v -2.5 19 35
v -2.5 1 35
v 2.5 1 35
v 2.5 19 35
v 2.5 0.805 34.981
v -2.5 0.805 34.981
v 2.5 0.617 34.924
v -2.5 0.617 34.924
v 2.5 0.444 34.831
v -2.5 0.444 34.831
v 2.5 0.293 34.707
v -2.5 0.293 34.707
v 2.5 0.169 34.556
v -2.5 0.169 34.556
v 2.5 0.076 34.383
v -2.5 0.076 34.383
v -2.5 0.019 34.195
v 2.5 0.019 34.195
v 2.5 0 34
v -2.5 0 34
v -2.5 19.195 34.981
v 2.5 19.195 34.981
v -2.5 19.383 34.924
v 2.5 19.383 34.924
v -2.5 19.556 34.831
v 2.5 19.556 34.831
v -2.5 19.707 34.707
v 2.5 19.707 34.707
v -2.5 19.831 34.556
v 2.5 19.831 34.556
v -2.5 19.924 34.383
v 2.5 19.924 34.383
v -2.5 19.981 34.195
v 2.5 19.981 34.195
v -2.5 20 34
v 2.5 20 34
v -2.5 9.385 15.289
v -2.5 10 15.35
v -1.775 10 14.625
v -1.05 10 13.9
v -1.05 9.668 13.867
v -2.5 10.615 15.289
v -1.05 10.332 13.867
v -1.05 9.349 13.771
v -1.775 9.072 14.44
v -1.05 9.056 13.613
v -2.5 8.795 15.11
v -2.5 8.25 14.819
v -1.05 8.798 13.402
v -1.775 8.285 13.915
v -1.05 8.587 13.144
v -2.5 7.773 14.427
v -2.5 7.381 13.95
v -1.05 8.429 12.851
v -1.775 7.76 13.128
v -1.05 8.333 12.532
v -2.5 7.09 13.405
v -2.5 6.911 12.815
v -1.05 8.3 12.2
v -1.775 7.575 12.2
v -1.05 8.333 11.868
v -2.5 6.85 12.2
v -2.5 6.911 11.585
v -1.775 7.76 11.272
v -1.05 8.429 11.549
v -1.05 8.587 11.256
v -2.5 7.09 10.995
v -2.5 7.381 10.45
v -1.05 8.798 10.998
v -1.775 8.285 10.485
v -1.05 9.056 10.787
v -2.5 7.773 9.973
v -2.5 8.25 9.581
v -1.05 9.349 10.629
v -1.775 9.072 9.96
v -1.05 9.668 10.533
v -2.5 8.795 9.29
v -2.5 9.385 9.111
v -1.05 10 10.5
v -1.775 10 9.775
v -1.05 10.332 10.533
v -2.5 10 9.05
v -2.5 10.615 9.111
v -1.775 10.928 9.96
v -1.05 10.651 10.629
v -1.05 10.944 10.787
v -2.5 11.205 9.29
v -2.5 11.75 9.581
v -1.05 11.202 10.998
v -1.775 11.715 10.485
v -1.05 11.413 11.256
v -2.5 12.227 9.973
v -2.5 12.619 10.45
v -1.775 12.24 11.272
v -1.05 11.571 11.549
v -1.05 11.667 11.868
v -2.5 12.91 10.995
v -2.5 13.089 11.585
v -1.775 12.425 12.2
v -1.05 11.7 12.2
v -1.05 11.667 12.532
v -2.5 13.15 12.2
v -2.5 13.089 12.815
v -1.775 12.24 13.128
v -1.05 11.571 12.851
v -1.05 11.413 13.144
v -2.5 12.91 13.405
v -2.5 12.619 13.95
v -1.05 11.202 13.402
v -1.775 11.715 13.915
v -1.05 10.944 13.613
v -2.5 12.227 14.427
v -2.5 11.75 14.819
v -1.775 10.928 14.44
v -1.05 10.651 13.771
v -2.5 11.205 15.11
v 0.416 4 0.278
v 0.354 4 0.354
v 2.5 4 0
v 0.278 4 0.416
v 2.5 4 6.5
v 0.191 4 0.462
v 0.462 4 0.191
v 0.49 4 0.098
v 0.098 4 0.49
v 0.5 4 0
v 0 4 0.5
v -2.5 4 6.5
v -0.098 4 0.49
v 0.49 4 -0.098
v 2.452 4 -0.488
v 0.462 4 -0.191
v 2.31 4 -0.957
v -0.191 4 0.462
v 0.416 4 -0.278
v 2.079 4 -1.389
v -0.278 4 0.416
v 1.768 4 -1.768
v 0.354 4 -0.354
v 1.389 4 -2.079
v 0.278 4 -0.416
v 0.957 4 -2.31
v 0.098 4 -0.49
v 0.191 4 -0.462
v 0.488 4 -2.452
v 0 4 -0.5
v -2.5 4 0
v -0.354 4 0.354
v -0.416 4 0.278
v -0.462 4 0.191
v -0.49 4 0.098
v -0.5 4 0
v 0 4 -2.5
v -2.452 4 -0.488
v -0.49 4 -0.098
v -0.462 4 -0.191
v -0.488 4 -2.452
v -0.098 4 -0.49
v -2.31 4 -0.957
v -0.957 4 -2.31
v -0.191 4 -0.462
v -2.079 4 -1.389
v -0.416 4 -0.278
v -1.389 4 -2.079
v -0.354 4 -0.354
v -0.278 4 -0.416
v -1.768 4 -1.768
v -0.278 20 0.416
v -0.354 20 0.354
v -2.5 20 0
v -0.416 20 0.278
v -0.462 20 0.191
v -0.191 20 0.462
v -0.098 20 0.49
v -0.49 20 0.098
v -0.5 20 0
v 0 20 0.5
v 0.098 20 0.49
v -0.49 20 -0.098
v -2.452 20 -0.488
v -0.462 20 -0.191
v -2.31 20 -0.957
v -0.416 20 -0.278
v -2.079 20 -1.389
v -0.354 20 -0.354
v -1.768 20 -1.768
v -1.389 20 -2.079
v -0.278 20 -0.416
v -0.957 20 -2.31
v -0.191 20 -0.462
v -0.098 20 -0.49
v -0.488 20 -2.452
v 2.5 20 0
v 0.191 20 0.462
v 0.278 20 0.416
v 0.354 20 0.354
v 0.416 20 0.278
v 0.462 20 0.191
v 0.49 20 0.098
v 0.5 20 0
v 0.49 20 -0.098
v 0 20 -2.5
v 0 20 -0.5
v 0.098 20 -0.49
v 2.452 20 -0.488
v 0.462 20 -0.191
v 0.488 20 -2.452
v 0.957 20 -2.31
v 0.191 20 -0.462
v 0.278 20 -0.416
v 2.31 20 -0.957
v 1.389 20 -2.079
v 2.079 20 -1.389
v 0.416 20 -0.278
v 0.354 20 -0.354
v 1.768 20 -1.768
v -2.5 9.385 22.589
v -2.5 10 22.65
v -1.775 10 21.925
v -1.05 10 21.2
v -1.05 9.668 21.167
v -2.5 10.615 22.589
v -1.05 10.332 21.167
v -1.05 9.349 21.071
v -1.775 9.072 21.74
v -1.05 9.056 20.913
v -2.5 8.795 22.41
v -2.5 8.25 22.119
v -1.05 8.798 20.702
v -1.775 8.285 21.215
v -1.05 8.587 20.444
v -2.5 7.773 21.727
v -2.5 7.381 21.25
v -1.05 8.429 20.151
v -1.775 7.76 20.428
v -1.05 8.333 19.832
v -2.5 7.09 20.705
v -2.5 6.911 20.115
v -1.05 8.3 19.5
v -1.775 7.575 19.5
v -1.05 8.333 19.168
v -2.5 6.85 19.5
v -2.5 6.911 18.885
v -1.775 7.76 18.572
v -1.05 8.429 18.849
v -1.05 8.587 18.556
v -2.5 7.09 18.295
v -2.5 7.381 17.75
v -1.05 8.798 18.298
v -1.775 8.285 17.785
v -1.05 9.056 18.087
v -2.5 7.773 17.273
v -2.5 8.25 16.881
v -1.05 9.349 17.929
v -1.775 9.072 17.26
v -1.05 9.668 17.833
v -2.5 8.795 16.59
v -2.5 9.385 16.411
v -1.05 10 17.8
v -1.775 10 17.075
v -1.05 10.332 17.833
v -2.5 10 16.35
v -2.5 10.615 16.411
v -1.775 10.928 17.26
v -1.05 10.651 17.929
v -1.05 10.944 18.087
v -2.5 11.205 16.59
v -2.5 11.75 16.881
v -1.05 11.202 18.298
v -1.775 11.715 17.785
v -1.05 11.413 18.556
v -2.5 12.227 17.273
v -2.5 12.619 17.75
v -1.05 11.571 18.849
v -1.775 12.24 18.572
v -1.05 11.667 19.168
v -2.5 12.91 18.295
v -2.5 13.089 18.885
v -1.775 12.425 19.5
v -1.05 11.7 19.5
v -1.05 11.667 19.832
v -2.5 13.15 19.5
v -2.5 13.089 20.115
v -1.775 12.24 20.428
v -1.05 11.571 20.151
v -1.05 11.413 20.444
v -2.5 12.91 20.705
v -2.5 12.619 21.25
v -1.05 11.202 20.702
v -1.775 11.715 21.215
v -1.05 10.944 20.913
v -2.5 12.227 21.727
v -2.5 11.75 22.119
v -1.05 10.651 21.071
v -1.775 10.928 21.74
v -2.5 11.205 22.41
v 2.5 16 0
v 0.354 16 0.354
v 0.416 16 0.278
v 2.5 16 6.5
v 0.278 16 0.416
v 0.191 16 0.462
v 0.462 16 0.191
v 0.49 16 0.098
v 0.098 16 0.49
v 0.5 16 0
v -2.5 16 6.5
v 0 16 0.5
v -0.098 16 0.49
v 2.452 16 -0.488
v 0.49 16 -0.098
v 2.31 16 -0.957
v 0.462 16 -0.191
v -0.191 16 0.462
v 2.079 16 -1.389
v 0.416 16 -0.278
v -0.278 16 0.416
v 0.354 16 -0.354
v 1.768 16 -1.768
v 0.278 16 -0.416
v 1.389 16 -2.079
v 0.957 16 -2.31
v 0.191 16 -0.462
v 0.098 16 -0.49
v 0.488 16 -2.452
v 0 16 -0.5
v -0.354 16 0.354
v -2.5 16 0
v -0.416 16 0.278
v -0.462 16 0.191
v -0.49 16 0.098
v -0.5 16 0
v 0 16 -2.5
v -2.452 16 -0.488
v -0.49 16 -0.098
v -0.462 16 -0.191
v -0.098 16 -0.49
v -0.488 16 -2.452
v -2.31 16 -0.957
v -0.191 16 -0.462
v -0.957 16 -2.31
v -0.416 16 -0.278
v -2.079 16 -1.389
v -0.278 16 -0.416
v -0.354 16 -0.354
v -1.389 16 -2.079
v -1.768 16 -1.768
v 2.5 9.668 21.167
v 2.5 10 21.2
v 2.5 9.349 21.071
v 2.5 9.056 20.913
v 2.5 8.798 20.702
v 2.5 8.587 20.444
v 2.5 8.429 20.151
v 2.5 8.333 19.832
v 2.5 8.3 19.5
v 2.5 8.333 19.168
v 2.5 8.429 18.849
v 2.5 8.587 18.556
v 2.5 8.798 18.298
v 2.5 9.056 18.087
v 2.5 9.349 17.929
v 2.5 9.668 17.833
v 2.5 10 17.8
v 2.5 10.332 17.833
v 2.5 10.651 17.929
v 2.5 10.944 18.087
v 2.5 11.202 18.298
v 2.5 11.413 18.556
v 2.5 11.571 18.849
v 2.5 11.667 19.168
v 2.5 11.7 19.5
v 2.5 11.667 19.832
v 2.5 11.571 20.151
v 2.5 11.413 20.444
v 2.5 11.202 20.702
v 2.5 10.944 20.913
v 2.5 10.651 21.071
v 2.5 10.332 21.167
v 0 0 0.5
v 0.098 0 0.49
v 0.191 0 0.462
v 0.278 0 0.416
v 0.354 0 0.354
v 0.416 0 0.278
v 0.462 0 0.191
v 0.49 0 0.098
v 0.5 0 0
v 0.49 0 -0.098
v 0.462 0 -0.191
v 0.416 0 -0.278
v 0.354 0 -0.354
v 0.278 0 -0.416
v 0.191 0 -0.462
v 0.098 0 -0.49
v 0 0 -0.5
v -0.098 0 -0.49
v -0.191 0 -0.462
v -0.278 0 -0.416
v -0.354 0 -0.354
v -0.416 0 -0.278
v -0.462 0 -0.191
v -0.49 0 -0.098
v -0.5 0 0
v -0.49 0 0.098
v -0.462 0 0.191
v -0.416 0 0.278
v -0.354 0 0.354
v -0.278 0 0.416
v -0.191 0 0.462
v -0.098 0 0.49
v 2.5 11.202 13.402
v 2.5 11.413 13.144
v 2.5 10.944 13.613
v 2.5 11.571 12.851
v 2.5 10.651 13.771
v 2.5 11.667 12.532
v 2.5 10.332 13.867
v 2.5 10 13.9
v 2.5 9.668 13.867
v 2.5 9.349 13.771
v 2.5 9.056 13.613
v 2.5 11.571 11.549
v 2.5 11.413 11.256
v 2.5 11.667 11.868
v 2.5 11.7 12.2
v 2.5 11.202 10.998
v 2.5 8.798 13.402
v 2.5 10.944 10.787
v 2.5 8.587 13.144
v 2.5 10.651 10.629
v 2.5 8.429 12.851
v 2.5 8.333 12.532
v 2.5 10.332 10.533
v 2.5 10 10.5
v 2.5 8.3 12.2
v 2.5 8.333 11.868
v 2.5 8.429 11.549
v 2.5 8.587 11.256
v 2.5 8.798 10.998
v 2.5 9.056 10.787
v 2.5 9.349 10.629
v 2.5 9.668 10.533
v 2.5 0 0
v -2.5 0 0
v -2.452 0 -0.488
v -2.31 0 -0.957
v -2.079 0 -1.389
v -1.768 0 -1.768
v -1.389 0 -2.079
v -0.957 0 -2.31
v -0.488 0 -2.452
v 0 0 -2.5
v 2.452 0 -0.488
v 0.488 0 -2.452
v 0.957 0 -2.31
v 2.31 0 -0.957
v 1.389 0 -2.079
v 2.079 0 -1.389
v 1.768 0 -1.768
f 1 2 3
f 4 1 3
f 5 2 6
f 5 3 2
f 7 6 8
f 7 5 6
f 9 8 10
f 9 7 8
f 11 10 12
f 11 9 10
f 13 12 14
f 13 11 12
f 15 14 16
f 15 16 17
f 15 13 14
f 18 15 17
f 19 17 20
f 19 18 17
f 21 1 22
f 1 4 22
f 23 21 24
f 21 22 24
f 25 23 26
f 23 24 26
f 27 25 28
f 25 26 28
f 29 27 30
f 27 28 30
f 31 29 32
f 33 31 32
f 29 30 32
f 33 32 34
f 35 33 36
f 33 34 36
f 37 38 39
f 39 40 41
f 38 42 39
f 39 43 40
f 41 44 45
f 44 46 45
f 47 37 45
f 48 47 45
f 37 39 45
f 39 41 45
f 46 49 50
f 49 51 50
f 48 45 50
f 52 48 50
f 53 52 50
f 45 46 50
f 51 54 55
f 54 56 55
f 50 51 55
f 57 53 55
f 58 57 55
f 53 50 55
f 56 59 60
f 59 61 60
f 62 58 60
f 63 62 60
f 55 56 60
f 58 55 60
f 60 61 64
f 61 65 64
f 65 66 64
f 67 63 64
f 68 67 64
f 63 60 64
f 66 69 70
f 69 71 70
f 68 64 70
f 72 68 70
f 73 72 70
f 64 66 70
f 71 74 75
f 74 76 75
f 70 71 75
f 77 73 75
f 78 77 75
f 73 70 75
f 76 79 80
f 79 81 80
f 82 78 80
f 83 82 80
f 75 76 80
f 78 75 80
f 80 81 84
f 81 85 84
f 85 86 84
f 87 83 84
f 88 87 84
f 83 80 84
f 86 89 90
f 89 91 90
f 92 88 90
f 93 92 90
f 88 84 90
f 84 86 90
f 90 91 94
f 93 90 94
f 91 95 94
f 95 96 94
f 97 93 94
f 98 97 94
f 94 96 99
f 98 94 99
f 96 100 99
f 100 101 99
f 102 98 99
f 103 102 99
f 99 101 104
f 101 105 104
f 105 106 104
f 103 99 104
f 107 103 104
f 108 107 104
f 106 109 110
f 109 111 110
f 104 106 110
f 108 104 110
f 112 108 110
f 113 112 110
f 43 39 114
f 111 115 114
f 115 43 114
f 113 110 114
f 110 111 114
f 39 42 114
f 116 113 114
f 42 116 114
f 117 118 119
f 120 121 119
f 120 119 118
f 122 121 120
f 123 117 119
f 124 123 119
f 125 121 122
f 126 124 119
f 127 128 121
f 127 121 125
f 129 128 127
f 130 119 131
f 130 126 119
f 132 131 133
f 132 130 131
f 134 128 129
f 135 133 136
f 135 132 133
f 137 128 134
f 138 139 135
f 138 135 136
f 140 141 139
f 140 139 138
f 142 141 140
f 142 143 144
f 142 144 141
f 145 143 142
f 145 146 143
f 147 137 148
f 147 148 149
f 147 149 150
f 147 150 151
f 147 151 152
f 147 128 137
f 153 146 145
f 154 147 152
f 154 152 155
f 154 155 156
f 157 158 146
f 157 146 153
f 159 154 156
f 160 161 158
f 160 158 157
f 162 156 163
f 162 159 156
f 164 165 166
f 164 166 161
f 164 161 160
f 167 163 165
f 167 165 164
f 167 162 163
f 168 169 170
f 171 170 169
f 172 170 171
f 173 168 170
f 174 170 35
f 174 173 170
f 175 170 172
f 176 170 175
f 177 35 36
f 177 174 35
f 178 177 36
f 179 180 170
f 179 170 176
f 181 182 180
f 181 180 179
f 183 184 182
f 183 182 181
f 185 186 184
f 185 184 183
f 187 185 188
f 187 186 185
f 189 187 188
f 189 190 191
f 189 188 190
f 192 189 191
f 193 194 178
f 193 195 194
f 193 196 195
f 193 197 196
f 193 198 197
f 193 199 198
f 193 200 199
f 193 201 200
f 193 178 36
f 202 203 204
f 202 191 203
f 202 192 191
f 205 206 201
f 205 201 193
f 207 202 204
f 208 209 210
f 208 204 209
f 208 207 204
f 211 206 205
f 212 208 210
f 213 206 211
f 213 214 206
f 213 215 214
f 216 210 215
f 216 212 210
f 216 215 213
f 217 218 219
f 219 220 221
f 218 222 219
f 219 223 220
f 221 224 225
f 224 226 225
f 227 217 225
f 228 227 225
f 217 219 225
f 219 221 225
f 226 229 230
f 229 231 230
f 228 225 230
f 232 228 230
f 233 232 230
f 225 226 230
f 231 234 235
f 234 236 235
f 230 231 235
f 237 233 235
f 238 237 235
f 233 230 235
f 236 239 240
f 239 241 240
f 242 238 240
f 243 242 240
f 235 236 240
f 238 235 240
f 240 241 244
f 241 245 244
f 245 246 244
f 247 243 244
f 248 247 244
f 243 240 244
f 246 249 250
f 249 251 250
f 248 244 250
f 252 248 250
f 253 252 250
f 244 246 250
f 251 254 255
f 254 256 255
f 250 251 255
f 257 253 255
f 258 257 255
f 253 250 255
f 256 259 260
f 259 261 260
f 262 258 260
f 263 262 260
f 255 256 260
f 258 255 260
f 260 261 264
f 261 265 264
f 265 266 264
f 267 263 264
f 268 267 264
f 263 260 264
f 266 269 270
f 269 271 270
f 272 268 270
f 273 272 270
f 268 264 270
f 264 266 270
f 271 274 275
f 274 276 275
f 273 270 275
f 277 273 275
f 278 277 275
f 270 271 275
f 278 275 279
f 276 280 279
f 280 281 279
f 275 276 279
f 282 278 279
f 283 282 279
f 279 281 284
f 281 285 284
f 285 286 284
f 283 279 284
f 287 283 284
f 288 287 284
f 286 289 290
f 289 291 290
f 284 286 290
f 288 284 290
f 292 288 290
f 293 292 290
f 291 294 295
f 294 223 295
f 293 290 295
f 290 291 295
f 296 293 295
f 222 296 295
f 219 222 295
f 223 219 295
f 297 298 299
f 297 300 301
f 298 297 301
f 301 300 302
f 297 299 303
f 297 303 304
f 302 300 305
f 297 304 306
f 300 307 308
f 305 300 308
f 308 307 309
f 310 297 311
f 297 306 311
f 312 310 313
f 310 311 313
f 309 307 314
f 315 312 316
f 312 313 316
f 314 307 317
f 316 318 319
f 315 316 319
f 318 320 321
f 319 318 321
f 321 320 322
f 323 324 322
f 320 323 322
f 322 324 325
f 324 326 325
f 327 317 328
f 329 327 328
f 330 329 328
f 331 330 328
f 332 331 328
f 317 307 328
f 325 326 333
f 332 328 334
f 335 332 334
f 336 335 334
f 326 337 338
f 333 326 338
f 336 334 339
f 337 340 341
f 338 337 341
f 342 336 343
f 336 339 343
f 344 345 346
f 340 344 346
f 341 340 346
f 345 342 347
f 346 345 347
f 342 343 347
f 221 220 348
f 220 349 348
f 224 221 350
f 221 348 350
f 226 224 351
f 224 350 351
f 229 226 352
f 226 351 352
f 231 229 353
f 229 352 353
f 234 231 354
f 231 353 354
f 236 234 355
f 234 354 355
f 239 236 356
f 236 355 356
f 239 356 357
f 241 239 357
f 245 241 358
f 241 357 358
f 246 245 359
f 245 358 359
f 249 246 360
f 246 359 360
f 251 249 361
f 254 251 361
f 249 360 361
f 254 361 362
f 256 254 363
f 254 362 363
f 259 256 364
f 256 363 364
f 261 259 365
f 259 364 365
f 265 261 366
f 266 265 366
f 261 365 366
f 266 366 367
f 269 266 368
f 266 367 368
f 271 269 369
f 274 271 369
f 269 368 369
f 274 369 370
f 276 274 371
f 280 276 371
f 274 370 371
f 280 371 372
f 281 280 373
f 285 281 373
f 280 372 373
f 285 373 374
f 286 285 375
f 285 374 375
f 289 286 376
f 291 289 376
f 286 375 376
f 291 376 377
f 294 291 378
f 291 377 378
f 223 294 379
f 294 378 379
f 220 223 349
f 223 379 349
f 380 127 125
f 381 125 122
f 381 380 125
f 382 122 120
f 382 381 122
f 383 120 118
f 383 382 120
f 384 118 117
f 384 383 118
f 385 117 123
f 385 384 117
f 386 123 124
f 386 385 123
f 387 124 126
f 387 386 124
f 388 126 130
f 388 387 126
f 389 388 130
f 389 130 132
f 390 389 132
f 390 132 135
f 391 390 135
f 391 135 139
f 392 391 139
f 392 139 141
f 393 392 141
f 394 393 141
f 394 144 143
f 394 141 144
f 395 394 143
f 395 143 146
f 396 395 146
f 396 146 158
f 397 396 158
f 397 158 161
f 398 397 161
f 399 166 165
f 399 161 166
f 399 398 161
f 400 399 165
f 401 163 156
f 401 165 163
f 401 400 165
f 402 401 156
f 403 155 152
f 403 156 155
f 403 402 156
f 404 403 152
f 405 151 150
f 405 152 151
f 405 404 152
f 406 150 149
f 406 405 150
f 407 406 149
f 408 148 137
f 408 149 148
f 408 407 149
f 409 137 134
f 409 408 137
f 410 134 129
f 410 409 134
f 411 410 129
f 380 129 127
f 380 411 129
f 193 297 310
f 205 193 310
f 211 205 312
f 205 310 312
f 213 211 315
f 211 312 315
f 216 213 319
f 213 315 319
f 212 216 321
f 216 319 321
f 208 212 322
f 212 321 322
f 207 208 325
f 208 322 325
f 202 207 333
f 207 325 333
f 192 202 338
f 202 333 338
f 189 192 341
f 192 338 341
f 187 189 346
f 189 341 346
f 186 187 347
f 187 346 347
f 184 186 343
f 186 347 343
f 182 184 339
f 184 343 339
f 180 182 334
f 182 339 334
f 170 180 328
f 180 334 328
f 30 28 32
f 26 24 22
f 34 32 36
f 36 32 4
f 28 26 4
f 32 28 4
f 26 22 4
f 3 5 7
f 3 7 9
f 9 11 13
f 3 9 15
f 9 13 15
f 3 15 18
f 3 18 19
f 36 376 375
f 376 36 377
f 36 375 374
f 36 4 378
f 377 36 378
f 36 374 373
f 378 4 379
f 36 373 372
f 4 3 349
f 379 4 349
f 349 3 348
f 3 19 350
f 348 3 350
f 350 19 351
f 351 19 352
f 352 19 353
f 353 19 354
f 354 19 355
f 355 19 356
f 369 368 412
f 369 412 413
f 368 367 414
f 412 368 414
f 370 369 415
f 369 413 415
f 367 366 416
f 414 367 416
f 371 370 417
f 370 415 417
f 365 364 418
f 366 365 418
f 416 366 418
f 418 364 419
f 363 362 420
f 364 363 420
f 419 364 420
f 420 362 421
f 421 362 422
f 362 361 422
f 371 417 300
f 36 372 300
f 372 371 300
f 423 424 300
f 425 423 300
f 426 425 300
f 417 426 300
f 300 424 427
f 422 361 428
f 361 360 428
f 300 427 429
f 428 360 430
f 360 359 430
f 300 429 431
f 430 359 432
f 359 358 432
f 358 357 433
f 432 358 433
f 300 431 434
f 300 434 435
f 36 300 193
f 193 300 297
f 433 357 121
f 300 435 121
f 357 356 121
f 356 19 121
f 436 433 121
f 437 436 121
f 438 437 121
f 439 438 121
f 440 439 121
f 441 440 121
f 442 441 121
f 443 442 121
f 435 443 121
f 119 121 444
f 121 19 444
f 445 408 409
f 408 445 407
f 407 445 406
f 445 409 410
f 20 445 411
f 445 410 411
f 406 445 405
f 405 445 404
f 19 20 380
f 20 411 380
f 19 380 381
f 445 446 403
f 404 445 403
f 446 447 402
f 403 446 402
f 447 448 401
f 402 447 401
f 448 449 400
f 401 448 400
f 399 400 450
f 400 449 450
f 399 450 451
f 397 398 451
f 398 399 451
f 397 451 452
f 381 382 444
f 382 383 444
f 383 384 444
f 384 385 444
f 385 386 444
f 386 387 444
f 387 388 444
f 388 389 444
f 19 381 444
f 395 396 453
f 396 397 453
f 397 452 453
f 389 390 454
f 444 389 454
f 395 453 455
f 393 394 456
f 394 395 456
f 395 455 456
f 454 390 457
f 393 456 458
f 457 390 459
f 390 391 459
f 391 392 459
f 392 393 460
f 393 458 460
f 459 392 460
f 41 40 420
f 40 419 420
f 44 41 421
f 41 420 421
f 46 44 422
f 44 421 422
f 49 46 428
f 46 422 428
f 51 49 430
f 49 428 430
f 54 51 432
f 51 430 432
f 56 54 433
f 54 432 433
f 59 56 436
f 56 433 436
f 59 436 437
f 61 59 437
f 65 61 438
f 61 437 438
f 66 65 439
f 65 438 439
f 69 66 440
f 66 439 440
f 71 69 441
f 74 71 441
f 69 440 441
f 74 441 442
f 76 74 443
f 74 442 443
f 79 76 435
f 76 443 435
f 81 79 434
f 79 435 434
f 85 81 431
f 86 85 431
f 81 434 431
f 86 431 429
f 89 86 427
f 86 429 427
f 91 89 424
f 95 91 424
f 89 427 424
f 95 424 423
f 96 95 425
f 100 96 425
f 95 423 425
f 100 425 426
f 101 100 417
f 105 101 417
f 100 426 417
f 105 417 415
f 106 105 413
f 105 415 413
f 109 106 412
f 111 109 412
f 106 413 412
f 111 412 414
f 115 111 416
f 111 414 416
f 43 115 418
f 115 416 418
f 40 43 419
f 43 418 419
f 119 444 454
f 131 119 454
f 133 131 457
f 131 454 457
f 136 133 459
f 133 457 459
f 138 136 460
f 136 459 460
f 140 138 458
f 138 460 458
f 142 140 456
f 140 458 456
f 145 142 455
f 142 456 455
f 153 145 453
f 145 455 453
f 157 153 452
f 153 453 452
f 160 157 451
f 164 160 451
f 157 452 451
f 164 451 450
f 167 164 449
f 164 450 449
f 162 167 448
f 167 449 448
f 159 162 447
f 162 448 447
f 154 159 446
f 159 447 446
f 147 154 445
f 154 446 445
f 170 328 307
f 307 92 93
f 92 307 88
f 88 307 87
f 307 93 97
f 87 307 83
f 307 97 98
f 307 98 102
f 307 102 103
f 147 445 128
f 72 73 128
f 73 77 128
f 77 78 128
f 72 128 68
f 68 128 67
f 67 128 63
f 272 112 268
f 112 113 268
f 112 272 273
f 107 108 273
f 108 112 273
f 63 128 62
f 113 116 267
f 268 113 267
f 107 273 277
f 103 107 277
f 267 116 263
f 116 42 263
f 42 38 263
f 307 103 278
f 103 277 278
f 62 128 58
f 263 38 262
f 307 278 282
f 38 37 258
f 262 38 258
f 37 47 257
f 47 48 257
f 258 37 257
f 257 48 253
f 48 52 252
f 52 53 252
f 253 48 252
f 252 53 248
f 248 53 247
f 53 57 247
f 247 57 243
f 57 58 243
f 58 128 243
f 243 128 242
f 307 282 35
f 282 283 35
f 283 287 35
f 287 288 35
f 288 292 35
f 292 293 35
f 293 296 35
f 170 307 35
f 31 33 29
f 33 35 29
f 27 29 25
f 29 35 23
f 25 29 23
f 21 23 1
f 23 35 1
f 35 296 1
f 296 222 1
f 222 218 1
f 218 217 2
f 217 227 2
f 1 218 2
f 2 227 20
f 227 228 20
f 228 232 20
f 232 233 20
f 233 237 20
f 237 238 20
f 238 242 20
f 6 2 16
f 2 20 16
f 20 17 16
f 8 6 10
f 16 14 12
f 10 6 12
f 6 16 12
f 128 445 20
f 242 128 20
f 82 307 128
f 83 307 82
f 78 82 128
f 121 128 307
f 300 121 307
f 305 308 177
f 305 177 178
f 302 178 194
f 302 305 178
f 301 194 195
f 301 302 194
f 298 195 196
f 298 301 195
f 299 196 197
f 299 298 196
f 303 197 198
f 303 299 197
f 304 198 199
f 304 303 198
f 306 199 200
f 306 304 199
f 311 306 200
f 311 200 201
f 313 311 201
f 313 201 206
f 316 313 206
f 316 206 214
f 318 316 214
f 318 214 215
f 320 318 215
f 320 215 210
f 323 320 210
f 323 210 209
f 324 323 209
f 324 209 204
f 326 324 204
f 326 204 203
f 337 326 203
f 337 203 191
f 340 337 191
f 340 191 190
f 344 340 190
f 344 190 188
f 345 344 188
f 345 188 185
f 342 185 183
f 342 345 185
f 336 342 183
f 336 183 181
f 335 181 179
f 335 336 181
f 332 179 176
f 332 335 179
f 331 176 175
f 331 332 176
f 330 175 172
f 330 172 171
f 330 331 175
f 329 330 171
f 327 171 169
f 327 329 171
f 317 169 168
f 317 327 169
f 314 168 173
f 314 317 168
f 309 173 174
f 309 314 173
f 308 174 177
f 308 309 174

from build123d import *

# Parameters (mm, degrees)
SKETCHSIDE_R                          = 0.5
BOSSEXTRUDESIDE_DEPTH                 = 20
CUTEXTRUDEDISTALROOM_DEPTH            = 41.388736054
CUTEXTRUDEDISTALROOM_DEPTH_BACK       = 41.388736054
SKETCHDISTALROOM_W                    = 9
SKETCHDISTALROOM_H                    = 12
FILLETBUTTOM_R                        = 1
CSKM3FLATHEADMACHINESCREW_D           = 3.4
CSKM3FLATHEADMACHINESCREW_CSINK_D     = 6.3
CSKM3FLATHEADMACHINESCREW_CSINK_ANGLE = 90


with BuildPart() as part:
    # SketchSide → BossExtrudeSide (new body)
    with BuildSketch(Plane(origin=(0, 0, 0), x_dir=(1, 0, 0), z_dir=(0, 1, 0))):
        with BuildLine():
            Line((-2.5, -35), (2.5, -35))
            Line((2.5, -35), (2.5, 0))
            ThreePointArc((2.5, 0), (0, 2.5), (-2.5, 0))
            Line((-2.5, 0), (-2.5, -35))
        make_face()
        with Locations(Location((0, 0, 0), (0, 0, 270))):
            Circle(SKETCHSIDE_R, mode=Mode.SUBTRACT)
    extrude(amount=BOSSEXTRUDESIDE_DEPTH)

    # SketchDistalRoom → CutExtrudeDistalRoom (cut, two sides: drawn at the far end of the back side and taken through both)
    with BuildSketch(Plane(origin=(0, 0, 0), x_dir=(0, 0, -1), z_dir=(1, 0, 0)).offset(-CUTEXTRUDEDISTALROOM_DEPTH_BACK)):
        with Locations((-2, 10)):
            Rectangle(SKETCHDISTALROOM_W, SKETCHDISTALROOM_H)
    extrude(amount=CUTEXTRUDEDISTALROOM_DEPTH + CUTEXTRUDEDISTALROOM_DEPTH_BACK, mode=Mode.SUBTRACT)

    # FilletButtom
    filletbuttom_edges = [part.edges().sort_by_distance(p)[0] for p in [
        (0, 0, 35),
        (0, 20, 35),
    ]]
    fillet(filletbuttom_edges, radius=FILLETBUTTOM_R)

    # CSKM3FlatHeadMachineScrew (through all)
    with Locations(Plane(origin=(-2.5, 10, 12.2), x_dir=(0, 0, -1), z_dir=(-1, 0, 0))):
        with Locations((0, 0), (-7.3, 0)):
            CounterSinkHole(CSKM3FLATHEADMACHINESCREW_D / 2, CSKM3FLATHEADMACHINESCREW_CSINK_D / 2, counter_sink_angle=CSKM3FLATHEADMACHINESCREW_CSINK_ANGLE)


solid = part.part
